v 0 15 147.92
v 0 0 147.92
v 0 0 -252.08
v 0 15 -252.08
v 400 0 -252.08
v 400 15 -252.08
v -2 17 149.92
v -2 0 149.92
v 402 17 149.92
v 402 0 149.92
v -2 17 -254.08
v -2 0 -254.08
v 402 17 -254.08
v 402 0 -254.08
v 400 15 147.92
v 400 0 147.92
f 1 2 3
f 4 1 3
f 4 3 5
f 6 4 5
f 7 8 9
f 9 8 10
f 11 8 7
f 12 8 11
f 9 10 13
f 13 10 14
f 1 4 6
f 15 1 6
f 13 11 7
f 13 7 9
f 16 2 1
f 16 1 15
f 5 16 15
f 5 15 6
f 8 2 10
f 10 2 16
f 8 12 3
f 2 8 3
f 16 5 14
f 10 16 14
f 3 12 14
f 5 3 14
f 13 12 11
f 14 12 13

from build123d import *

# Parameters (mm, degrees)
SKETCH1_W           = 404
SKETCH1_H           = 404
SKETCH1_W_2         = 400
SKETCH1_H_2         = 400
BOSS_EXTRUDE1_DEPTH = 15
SKETCH3_W           = 404
SKETCH3_H           = 404
BOSS_EXTRUDE2_DEPTH = 2


with BuildPart() as part:
    # Sketch1 → Boss-Extrude1 (new body)
    with BuildSketch(Plane(origin=(0, 0, 0), x_dir=(1, 0, 0), z_dir=(0, 1, 0))):
        with Locations((200, 52.080415622)):
            Rectangle(SKETCH1_W, SKETCH1_H)
        with Locations((200, 52.080415622)):
            Rectangle(SKETCH1_W_2, SKETCH1_H_2, mode=Mode.SUBTRACT)
    extrude(amount=BOSS_EXTRUDE1_DEPTH)

    # Sketch3 → Boss-Extrude2 (add)
    with BuildSketch(Plane(origin=(0, 15, 0), x_dir=(1, 0, 0), z_dir=(0, 1, 0))):
        with Locations((200, 52.080415622)):
            Rectangle(SKETCH3_W, SKETCH3_H)
    extrude(amount=BOSS_EXTRUDE2_DEPTH)


solid = part.part
